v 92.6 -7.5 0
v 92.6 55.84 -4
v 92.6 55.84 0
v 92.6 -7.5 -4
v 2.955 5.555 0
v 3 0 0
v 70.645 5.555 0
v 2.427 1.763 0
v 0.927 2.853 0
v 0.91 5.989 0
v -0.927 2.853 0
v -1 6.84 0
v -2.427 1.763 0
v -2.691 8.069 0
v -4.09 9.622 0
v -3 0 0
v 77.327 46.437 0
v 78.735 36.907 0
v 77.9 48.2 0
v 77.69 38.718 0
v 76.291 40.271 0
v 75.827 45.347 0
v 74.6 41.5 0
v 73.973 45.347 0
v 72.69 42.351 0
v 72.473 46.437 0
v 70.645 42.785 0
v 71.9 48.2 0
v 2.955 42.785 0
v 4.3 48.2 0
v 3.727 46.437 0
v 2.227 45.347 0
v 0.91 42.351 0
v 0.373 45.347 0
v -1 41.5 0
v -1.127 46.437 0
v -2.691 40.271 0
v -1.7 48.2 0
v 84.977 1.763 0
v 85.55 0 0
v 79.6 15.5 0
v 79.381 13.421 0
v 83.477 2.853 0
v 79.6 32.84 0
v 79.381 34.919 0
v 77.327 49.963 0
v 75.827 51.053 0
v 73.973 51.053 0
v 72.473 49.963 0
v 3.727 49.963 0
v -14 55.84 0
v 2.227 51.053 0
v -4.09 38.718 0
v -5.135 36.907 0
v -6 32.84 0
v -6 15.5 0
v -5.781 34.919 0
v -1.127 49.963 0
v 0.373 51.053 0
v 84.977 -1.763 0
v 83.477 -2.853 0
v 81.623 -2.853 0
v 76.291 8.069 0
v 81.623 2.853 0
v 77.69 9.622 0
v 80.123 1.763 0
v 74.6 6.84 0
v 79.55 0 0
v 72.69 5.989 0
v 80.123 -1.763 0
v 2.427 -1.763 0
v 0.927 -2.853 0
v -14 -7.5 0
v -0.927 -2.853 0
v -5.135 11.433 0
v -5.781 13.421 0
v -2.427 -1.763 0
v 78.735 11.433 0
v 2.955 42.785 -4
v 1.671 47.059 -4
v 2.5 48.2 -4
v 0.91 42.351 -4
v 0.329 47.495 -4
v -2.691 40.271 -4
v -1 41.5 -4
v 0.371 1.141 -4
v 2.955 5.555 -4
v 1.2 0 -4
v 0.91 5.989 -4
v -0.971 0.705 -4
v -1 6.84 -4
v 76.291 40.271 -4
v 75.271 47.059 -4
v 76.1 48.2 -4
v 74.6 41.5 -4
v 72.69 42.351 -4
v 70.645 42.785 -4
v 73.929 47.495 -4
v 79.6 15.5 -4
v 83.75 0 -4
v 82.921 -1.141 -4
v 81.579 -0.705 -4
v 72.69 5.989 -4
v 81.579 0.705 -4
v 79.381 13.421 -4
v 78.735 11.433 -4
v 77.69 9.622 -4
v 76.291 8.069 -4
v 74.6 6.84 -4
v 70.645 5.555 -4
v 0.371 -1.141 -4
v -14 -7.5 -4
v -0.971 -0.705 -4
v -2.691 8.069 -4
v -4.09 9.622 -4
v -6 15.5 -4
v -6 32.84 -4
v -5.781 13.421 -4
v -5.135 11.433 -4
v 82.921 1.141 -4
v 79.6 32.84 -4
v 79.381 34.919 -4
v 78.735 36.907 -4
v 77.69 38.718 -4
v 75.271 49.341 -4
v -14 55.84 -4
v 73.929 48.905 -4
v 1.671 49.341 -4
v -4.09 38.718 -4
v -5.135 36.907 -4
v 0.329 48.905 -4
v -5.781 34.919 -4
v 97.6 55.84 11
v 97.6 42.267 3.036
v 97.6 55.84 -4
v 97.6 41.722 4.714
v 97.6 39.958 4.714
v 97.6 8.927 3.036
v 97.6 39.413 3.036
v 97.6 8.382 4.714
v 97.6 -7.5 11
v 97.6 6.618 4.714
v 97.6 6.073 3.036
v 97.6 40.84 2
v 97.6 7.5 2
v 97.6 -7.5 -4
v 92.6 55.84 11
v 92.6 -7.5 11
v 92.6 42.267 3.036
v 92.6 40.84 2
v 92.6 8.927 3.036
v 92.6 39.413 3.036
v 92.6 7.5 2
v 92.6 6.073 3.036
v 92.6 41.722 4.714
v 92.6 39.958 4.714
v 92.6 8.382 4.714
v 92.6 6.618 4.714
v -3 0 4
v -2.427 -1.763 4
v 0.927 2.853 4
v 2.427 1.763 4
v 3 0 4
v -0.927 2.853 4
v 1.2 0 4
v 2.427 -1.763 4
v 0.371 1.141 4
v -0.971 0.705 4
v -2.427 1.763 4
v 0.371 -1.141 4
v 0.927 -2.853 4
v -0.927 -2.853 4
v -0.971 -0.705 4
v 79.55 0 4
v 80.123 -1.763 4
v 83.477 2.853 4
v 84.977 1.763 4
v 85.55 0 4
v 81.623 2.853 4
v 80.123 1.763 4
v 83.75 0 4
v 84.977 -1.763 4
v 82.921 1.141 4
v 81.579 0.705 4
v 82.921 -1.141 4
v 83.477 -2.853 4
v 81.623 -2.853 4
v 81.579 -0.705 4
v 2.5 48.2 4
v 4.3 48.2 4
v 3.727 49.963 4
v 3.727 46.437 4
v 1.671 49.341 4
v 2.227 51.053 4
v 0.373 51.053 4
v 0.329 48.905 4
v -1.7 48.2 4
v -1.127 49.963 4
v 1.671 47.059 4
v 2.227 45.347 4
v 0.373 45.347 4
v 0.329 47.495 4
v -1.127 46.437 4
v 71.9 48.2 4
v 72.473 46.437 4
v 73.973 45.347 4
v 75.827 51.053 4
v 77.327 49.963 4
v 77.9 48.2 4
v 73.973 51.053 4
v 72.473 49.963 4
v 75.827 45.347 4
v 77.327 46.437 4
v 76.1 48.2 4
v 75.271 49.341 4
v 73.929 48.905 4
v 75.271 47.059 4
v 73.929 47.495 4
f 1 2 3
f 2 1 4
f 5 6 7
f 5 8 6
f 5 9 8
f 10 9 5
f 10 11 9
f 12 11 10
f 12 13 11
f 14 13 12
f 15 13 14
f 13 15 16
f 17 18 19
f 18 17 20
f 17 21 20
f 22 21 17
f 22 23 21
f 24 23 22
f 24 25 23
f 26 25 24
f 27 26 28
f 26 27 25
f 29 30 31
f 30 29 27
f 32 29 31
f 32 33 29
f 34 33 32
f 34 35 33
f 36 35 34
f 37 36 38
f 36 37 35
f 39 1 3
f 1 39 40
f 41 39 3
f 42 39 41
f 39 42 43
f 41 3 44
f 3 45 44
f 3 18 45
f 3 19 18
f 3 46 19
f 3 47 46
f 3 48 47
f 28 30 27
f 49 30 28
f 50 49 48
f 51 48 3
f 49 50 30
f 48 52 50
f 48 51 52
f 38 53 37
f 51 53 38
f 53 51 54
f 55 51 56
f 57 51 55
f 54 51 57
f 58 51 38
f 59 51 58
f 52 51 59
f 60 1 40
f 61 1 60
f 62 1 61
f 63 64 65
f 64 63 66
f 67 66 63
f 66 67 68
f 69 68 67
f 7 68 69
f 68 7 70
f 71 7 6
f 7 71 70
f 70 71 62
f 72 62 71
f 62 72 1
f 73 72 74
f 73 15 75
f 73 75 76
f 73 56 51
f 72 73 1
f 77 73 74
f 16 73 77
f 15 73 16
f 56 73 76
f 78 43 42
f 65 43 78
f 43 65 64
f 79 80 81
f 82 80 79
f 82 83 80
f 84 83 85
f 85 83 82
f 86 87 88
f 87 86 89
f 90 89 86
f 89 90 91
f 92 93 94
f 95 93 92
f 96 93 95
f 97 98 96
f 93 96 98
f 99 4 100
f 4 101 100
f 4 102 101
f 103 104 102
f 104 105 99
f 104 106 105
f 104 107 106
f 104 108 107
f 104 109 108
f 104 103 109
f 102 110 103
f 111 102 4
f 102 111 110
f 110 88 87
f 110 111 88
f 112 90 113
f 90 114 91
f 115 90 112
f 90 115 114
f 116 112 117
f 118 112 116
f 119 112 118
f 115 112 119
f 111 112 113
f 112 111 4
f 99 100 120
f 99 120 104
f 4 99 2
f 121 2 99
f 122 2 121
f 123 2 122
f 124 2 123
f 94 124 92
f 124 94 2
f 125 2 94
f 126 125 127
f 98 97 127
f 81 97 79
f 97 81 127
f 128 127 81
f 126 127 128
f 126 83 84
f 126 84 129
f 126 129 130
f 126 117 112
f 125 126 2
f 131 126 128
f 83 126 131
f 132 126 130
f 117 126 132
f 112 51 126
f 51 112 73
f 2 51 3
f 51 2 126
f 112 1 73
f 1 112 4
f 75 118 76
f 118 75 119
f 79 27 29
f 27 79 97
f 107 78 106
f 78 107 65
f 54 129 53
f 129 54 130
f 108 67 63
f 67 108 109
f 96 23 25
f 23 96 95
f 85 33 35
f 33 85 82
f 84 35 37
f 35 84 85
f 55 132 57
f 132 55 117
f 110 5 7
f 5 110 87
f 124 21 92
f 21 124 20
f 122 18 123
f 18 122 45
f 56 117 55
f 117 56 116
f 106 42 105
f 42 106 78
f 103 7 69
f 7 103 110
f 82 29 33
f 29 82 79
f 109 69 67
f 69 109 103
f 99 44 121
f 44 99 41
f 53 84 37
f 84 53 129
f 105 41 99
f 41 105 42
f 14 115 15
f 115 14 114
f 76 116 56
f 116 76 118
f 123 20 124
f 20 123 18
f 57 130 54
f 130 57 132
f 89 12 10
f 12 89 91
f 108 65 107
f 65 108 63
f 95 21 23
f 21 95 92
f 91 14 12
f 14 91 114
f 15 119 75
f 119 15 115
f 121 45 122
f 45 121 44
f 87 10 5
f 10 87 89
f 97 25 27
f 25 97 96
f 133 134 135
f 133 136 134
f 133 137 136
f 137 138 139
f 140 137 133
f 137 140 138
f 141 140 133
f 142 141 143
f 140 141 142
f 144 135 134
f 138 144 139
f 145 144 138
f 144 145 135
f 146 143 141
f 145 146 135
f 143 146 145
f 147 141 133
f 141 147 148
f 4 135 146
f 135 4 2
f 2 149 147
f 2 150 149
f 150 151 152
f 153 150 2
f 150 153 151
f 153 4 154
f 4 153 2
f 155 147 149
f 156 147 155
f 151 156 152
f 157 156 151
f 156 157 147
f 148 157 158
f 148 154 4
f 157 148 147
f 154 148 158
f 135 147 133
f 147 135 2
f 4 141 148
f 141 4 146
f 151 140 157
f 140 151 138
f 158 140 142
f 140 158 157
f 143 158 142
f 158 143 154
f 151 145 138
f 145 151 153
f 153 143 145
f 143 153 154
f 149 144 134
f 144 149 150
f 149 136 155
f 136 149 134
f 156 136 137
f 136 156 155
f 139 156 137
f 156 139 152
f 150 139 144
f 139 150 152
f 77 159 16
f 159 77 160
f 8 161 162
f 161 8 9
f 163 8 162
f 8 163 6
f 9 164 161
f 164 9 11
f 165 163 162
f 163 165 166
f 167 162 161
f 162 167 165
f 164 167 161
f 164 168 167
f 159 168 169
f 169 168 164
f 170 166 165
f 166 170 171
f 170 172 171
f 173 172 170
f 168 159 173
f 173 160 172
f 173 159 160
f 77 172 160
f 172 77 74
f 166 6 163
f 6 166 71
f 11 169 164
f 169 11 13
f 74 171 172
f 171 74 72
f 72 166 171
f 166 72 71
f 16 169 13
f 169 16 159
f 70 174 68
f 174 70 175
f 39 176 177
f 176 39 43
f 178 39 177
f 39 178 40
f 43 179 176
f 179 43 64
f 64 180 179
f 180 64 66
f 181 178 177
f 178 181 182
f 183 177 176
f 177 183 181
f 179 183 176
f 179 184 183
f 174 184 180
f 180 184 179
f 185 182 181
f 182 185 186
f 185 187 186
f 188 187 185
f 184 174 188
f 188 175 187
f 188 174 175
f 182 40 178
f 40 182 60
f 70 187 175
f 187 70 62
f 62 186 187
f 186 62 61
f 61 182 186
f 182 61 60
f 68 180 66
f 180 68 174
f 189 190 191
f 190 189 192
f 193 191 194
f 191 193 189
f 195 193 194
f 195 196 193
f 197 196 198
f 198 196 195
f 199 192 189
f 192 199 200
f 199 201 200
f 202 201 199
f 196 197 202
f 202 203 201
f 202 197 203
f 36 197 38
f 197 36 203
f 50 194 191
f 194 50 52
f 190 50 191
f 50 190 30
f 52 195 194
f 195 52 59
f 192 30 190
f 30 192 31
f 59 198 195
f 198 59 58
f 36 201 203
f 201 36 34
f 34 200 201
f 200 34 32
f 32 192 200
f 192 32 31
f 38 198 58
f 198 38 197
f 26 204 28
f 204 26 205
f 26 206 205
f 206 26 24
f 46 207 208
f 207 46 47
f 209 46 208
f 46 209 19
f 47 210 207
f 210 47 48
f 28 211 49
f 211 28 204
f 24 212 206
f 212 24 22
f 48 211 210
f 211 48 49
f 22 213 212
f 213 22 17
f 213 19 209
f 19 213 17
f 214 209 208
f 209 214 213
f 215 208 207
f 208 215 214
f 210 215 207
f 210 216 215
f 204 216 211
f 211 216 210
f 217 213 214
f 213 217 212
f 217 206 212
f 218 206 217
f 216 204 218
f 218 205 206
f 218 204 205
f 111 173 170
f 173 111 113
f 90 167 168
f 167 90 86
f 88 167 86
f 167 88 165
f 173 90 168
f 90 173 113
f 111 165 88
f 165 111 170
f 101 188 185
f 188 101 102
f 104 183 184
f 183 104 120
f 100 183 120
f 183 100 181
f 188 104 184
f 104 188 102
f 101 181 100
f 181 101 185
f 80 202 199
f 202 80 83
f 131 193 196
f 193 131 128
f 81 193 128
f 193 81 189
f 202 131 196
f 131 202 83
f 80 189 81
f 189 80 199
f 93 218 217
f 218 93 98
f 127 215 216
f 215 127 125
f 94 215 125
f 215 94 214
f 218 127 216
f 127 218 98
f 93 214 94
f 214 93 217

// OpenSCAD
include <MCAD/units.scad>;

sh=4;

trx=0;
try=0;

od=5;
id=-8;

m3i=15;

bh=4;

hp= [
      [trx,try,0],
      [trx+82.55,try,0],
      [trx+1.3,try+48.2,0],
      [trx+74.9,try+48.2,0]
     ];

module roundedCube(d,r){
    hull(){
        translate([+r,+r,0]) cylinder(r=r,h=d[2]);
        translate([d[0]-r,+r,0]) cylinder(r=r,h=d[2]);
        translate([+r,d[1]-r,0]) cylinder(r=r,h=d[2]);
        translate([d[0]-r,d[1]-r,0]) cylinder(r=r,h=d[2]);
    }
}
%translate([-14,-2.5,sh])cube([4*inch,2.1*inch,1.5]);
difference(){
    union(){
        difference(){
            translate([-14,-2.5-od,-bh])
                cube([4*inch+od,2.1*inch+2*od,bh]);
            translate([-14-id,-2.5-id,-bh])
                roundedCube([4*inch+2*id,2.1*inch+2*id,bh],10);
        }
        translate([4*inch+od-14,-2.5-od,-bh])
        difference(){
            cube([5,2.1*inch+2*od,15]);
            translate([-0.5, m3i, 15/2]) 
                rotate([0,90,0]) cylinder(r=3/2,h=6);
            translate([-0.5, 2.1*inch+2*od -m3i, 15/2]) 
                rotate([0,90,0]) cylinder(r=3/2,h=6);
        }
        for(p = hp) {
            translate(p) cylinder(r=3.0,h=sh);
        }
    }

    for(p = hp) {
        translate(p - [0,0,bh]) cylinder(r=1.2,h=sh+bh);
    }
}
